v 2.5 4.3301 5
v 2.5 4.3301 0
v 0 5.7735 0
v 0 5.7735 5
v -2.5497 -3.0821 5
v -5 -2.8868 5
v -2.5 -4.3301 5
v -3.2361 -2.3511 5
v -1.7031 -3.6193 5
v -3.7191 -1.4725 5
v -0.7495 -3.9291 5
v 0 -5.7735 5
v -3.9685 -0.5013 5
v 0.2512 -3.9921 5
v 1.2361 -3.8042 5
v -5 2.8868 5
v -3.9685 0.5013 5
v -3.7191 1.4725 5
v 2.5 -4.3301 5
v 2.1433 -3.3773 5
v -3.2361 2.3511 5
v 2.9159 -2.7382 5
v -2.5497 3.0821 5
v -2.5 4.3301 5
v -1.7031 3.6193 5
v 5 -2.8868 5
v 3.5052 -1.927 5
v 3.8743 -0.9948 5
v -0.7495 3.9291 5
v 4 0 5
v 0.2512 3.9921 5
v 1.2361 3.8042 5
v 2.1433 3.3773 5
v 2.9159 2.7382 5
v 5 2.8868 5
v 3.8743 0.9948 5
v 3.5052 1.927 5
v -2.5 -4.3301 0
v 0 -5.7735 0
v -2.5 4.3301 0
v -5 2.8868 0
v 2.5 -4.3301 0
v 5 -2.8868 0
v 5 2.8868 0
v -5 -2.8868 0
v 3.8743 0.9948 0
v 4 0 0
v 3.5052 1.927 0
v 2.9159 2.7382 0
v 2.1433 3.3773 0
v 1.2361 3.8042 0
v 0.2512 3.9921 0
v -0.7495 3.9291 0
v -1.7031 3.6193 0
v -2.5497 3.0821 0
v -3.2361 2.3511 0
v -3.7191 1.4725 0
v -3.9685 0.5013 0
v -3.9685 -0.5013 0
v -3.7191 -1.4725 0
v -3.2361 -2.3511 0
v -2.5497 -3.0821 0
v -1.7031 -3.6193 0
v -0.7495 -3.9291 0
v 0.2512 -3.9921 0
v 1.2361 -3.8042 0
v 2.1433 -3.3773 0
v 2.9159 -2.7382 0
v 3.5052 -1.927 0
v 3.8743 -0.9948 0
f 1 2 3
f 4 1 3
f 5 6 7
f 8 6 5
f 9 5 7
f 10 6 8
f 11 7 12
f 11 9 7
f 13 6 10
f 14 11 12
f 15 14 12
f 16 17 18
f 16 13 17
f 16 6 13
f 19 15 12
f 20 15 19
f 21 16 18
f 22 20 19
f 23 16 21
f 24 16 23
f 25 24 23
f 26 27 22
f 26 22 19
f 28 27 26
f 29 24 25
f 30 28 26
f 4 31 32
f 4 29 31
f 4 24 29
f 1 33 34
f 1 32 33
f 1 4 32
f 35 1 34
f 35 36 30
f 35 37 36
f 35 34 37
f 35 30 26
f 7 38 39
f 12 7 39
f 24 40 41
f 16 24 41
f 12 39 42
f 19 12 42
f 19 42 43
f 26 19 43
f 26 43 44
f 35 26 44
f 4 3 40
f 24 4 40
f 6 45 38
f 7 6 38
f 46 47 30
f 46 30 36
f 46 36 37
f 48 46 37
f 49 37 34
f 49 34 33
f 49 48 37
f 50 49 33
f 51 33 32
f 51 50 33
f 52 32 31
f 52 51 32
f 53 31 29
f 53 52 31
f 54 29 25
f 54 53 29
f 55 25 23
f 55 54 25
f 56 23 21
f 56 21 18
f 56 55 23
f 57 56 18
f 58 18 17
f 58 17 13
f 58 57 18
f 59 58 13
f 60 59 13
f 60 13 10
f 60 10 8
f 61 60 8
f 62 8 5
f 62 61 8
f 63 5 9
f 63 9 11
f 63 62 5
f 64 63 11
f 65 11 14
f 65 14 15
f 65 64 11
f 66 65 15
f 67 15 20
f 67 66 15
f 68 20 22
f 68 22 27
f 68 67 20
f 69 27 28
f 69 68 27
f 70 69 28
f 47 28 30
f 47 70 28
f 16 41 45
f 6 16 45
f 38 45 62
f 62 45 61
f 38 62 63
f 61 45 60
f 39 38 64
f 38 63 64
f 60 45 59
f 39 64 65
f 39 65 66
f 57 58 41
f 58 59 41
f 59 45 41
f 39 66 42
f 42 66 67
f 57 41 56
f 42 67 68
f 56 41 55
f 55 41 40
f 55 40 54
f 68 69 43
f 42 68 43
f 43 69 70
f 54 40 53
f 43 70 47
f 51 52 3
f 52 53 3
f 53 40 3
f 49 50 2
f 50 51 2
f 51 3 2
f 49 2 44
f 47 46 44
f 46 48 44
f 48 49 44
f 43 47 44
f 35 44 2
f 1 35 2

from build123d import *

# Parameters (mm, degrees)
F0_R     = 4
F1_DEPTH = 5


with BuildPart() as f1:
    # F0 (on Top) → F1 (new body)
    with BuildSketch(Plane.XY):
        with BuildLine():
            ThreePointArc((2.499999978, -4.3301270316), (4.3301270126, -2.500000011), (5, 0))
            ThreePointArc((5, 0), (4.330127022, 2.4999999946), (2.5000000107, 4.3301270127))
            ThreePointArc((2.5000000107, 4.3301270127), (-3.05e-08, 5), (-2.5000000636, 4.3301269822))
            ThreePointArc((-2.5000000636, 4.3301269822), (-4.3301270373, 2.4999999682), (-5, 0))
            ThreePointArc((-5, 0), (-4.3301270351, -2.4999999721), (-2.5000000559, -4.3301269867))
            ThreePointArc((-2.5000000559, -4.3301269867), (-4.5e-08, -5), (2.499999978, -4.3301270316))
        make_face()
        Circle(F0_R, mode=Mode.SUBTRACT)
        with BuildLine():
            Line((5, -2.8867513459), (5, 0))
            ThreePointArc((5, 0), (4.3301270126, -2.500000011), (2.499999978, -4.3301270316))
            Line((2.499999978, -4.3301270316), (5, -2.8867513459))
        make_face()
        with BuildLine():
            ThreePointArc((2.5000000107, 4.3301270127), (4.330127022, 2.4999999946), (5, 0))
            Line((5, 0), (5, 2.8867513459))
            Line((5, 2.8867513459), (2.5000000107, 4.3301270127))
        make_face()
        with BuildLine():
            ThreePointArc((-2.5000000636, 4.3301269822), (-3.05e-08, 5), (2.5000000107, 4.3301270127))
            Line((2.5000000107, 4.3301270127), (0, 5.7735026919))
            Line((0, 5.7735026919), (-2.5000000636, 4.3301269822))
        make_face()
        with BuildLine():
            Line((0, -5.7735026919), (2.499999978, -4.3301270316))
            ThreePointArc((2.499999978, -4.3301270316), (-4.5e-08, -5), (-2.5000000559, -4.3301269867))
            Line((-2.5000000559, -4.3301269867), (0, -5.7735026919))
        make_face()
        with BuildLine():
            ThreePointArc((-5, 0), (-4.3301270373, 2.4999999682), (-2.5000000636, 4.3301269822))
            Line((-2.5000000636, 4.3301269822), (-5, 2.8867513459))
            Line((-5, 2.8867513459), (-5, 0))
        make_face()
        with BuildLine():
            Line((-5, -2.8867513459), (-2.5000000559, -4.3301269867))
            ThreePointArc((-2.5000000559, -4.3301269867), (-4.3301270351, -2.4999999721), (-5, 0))
            Line((-5, 0), (-5, -2.8867513459))
        make_face()
    extrude(amount=F1_DEPTH)


solid = f1.part
